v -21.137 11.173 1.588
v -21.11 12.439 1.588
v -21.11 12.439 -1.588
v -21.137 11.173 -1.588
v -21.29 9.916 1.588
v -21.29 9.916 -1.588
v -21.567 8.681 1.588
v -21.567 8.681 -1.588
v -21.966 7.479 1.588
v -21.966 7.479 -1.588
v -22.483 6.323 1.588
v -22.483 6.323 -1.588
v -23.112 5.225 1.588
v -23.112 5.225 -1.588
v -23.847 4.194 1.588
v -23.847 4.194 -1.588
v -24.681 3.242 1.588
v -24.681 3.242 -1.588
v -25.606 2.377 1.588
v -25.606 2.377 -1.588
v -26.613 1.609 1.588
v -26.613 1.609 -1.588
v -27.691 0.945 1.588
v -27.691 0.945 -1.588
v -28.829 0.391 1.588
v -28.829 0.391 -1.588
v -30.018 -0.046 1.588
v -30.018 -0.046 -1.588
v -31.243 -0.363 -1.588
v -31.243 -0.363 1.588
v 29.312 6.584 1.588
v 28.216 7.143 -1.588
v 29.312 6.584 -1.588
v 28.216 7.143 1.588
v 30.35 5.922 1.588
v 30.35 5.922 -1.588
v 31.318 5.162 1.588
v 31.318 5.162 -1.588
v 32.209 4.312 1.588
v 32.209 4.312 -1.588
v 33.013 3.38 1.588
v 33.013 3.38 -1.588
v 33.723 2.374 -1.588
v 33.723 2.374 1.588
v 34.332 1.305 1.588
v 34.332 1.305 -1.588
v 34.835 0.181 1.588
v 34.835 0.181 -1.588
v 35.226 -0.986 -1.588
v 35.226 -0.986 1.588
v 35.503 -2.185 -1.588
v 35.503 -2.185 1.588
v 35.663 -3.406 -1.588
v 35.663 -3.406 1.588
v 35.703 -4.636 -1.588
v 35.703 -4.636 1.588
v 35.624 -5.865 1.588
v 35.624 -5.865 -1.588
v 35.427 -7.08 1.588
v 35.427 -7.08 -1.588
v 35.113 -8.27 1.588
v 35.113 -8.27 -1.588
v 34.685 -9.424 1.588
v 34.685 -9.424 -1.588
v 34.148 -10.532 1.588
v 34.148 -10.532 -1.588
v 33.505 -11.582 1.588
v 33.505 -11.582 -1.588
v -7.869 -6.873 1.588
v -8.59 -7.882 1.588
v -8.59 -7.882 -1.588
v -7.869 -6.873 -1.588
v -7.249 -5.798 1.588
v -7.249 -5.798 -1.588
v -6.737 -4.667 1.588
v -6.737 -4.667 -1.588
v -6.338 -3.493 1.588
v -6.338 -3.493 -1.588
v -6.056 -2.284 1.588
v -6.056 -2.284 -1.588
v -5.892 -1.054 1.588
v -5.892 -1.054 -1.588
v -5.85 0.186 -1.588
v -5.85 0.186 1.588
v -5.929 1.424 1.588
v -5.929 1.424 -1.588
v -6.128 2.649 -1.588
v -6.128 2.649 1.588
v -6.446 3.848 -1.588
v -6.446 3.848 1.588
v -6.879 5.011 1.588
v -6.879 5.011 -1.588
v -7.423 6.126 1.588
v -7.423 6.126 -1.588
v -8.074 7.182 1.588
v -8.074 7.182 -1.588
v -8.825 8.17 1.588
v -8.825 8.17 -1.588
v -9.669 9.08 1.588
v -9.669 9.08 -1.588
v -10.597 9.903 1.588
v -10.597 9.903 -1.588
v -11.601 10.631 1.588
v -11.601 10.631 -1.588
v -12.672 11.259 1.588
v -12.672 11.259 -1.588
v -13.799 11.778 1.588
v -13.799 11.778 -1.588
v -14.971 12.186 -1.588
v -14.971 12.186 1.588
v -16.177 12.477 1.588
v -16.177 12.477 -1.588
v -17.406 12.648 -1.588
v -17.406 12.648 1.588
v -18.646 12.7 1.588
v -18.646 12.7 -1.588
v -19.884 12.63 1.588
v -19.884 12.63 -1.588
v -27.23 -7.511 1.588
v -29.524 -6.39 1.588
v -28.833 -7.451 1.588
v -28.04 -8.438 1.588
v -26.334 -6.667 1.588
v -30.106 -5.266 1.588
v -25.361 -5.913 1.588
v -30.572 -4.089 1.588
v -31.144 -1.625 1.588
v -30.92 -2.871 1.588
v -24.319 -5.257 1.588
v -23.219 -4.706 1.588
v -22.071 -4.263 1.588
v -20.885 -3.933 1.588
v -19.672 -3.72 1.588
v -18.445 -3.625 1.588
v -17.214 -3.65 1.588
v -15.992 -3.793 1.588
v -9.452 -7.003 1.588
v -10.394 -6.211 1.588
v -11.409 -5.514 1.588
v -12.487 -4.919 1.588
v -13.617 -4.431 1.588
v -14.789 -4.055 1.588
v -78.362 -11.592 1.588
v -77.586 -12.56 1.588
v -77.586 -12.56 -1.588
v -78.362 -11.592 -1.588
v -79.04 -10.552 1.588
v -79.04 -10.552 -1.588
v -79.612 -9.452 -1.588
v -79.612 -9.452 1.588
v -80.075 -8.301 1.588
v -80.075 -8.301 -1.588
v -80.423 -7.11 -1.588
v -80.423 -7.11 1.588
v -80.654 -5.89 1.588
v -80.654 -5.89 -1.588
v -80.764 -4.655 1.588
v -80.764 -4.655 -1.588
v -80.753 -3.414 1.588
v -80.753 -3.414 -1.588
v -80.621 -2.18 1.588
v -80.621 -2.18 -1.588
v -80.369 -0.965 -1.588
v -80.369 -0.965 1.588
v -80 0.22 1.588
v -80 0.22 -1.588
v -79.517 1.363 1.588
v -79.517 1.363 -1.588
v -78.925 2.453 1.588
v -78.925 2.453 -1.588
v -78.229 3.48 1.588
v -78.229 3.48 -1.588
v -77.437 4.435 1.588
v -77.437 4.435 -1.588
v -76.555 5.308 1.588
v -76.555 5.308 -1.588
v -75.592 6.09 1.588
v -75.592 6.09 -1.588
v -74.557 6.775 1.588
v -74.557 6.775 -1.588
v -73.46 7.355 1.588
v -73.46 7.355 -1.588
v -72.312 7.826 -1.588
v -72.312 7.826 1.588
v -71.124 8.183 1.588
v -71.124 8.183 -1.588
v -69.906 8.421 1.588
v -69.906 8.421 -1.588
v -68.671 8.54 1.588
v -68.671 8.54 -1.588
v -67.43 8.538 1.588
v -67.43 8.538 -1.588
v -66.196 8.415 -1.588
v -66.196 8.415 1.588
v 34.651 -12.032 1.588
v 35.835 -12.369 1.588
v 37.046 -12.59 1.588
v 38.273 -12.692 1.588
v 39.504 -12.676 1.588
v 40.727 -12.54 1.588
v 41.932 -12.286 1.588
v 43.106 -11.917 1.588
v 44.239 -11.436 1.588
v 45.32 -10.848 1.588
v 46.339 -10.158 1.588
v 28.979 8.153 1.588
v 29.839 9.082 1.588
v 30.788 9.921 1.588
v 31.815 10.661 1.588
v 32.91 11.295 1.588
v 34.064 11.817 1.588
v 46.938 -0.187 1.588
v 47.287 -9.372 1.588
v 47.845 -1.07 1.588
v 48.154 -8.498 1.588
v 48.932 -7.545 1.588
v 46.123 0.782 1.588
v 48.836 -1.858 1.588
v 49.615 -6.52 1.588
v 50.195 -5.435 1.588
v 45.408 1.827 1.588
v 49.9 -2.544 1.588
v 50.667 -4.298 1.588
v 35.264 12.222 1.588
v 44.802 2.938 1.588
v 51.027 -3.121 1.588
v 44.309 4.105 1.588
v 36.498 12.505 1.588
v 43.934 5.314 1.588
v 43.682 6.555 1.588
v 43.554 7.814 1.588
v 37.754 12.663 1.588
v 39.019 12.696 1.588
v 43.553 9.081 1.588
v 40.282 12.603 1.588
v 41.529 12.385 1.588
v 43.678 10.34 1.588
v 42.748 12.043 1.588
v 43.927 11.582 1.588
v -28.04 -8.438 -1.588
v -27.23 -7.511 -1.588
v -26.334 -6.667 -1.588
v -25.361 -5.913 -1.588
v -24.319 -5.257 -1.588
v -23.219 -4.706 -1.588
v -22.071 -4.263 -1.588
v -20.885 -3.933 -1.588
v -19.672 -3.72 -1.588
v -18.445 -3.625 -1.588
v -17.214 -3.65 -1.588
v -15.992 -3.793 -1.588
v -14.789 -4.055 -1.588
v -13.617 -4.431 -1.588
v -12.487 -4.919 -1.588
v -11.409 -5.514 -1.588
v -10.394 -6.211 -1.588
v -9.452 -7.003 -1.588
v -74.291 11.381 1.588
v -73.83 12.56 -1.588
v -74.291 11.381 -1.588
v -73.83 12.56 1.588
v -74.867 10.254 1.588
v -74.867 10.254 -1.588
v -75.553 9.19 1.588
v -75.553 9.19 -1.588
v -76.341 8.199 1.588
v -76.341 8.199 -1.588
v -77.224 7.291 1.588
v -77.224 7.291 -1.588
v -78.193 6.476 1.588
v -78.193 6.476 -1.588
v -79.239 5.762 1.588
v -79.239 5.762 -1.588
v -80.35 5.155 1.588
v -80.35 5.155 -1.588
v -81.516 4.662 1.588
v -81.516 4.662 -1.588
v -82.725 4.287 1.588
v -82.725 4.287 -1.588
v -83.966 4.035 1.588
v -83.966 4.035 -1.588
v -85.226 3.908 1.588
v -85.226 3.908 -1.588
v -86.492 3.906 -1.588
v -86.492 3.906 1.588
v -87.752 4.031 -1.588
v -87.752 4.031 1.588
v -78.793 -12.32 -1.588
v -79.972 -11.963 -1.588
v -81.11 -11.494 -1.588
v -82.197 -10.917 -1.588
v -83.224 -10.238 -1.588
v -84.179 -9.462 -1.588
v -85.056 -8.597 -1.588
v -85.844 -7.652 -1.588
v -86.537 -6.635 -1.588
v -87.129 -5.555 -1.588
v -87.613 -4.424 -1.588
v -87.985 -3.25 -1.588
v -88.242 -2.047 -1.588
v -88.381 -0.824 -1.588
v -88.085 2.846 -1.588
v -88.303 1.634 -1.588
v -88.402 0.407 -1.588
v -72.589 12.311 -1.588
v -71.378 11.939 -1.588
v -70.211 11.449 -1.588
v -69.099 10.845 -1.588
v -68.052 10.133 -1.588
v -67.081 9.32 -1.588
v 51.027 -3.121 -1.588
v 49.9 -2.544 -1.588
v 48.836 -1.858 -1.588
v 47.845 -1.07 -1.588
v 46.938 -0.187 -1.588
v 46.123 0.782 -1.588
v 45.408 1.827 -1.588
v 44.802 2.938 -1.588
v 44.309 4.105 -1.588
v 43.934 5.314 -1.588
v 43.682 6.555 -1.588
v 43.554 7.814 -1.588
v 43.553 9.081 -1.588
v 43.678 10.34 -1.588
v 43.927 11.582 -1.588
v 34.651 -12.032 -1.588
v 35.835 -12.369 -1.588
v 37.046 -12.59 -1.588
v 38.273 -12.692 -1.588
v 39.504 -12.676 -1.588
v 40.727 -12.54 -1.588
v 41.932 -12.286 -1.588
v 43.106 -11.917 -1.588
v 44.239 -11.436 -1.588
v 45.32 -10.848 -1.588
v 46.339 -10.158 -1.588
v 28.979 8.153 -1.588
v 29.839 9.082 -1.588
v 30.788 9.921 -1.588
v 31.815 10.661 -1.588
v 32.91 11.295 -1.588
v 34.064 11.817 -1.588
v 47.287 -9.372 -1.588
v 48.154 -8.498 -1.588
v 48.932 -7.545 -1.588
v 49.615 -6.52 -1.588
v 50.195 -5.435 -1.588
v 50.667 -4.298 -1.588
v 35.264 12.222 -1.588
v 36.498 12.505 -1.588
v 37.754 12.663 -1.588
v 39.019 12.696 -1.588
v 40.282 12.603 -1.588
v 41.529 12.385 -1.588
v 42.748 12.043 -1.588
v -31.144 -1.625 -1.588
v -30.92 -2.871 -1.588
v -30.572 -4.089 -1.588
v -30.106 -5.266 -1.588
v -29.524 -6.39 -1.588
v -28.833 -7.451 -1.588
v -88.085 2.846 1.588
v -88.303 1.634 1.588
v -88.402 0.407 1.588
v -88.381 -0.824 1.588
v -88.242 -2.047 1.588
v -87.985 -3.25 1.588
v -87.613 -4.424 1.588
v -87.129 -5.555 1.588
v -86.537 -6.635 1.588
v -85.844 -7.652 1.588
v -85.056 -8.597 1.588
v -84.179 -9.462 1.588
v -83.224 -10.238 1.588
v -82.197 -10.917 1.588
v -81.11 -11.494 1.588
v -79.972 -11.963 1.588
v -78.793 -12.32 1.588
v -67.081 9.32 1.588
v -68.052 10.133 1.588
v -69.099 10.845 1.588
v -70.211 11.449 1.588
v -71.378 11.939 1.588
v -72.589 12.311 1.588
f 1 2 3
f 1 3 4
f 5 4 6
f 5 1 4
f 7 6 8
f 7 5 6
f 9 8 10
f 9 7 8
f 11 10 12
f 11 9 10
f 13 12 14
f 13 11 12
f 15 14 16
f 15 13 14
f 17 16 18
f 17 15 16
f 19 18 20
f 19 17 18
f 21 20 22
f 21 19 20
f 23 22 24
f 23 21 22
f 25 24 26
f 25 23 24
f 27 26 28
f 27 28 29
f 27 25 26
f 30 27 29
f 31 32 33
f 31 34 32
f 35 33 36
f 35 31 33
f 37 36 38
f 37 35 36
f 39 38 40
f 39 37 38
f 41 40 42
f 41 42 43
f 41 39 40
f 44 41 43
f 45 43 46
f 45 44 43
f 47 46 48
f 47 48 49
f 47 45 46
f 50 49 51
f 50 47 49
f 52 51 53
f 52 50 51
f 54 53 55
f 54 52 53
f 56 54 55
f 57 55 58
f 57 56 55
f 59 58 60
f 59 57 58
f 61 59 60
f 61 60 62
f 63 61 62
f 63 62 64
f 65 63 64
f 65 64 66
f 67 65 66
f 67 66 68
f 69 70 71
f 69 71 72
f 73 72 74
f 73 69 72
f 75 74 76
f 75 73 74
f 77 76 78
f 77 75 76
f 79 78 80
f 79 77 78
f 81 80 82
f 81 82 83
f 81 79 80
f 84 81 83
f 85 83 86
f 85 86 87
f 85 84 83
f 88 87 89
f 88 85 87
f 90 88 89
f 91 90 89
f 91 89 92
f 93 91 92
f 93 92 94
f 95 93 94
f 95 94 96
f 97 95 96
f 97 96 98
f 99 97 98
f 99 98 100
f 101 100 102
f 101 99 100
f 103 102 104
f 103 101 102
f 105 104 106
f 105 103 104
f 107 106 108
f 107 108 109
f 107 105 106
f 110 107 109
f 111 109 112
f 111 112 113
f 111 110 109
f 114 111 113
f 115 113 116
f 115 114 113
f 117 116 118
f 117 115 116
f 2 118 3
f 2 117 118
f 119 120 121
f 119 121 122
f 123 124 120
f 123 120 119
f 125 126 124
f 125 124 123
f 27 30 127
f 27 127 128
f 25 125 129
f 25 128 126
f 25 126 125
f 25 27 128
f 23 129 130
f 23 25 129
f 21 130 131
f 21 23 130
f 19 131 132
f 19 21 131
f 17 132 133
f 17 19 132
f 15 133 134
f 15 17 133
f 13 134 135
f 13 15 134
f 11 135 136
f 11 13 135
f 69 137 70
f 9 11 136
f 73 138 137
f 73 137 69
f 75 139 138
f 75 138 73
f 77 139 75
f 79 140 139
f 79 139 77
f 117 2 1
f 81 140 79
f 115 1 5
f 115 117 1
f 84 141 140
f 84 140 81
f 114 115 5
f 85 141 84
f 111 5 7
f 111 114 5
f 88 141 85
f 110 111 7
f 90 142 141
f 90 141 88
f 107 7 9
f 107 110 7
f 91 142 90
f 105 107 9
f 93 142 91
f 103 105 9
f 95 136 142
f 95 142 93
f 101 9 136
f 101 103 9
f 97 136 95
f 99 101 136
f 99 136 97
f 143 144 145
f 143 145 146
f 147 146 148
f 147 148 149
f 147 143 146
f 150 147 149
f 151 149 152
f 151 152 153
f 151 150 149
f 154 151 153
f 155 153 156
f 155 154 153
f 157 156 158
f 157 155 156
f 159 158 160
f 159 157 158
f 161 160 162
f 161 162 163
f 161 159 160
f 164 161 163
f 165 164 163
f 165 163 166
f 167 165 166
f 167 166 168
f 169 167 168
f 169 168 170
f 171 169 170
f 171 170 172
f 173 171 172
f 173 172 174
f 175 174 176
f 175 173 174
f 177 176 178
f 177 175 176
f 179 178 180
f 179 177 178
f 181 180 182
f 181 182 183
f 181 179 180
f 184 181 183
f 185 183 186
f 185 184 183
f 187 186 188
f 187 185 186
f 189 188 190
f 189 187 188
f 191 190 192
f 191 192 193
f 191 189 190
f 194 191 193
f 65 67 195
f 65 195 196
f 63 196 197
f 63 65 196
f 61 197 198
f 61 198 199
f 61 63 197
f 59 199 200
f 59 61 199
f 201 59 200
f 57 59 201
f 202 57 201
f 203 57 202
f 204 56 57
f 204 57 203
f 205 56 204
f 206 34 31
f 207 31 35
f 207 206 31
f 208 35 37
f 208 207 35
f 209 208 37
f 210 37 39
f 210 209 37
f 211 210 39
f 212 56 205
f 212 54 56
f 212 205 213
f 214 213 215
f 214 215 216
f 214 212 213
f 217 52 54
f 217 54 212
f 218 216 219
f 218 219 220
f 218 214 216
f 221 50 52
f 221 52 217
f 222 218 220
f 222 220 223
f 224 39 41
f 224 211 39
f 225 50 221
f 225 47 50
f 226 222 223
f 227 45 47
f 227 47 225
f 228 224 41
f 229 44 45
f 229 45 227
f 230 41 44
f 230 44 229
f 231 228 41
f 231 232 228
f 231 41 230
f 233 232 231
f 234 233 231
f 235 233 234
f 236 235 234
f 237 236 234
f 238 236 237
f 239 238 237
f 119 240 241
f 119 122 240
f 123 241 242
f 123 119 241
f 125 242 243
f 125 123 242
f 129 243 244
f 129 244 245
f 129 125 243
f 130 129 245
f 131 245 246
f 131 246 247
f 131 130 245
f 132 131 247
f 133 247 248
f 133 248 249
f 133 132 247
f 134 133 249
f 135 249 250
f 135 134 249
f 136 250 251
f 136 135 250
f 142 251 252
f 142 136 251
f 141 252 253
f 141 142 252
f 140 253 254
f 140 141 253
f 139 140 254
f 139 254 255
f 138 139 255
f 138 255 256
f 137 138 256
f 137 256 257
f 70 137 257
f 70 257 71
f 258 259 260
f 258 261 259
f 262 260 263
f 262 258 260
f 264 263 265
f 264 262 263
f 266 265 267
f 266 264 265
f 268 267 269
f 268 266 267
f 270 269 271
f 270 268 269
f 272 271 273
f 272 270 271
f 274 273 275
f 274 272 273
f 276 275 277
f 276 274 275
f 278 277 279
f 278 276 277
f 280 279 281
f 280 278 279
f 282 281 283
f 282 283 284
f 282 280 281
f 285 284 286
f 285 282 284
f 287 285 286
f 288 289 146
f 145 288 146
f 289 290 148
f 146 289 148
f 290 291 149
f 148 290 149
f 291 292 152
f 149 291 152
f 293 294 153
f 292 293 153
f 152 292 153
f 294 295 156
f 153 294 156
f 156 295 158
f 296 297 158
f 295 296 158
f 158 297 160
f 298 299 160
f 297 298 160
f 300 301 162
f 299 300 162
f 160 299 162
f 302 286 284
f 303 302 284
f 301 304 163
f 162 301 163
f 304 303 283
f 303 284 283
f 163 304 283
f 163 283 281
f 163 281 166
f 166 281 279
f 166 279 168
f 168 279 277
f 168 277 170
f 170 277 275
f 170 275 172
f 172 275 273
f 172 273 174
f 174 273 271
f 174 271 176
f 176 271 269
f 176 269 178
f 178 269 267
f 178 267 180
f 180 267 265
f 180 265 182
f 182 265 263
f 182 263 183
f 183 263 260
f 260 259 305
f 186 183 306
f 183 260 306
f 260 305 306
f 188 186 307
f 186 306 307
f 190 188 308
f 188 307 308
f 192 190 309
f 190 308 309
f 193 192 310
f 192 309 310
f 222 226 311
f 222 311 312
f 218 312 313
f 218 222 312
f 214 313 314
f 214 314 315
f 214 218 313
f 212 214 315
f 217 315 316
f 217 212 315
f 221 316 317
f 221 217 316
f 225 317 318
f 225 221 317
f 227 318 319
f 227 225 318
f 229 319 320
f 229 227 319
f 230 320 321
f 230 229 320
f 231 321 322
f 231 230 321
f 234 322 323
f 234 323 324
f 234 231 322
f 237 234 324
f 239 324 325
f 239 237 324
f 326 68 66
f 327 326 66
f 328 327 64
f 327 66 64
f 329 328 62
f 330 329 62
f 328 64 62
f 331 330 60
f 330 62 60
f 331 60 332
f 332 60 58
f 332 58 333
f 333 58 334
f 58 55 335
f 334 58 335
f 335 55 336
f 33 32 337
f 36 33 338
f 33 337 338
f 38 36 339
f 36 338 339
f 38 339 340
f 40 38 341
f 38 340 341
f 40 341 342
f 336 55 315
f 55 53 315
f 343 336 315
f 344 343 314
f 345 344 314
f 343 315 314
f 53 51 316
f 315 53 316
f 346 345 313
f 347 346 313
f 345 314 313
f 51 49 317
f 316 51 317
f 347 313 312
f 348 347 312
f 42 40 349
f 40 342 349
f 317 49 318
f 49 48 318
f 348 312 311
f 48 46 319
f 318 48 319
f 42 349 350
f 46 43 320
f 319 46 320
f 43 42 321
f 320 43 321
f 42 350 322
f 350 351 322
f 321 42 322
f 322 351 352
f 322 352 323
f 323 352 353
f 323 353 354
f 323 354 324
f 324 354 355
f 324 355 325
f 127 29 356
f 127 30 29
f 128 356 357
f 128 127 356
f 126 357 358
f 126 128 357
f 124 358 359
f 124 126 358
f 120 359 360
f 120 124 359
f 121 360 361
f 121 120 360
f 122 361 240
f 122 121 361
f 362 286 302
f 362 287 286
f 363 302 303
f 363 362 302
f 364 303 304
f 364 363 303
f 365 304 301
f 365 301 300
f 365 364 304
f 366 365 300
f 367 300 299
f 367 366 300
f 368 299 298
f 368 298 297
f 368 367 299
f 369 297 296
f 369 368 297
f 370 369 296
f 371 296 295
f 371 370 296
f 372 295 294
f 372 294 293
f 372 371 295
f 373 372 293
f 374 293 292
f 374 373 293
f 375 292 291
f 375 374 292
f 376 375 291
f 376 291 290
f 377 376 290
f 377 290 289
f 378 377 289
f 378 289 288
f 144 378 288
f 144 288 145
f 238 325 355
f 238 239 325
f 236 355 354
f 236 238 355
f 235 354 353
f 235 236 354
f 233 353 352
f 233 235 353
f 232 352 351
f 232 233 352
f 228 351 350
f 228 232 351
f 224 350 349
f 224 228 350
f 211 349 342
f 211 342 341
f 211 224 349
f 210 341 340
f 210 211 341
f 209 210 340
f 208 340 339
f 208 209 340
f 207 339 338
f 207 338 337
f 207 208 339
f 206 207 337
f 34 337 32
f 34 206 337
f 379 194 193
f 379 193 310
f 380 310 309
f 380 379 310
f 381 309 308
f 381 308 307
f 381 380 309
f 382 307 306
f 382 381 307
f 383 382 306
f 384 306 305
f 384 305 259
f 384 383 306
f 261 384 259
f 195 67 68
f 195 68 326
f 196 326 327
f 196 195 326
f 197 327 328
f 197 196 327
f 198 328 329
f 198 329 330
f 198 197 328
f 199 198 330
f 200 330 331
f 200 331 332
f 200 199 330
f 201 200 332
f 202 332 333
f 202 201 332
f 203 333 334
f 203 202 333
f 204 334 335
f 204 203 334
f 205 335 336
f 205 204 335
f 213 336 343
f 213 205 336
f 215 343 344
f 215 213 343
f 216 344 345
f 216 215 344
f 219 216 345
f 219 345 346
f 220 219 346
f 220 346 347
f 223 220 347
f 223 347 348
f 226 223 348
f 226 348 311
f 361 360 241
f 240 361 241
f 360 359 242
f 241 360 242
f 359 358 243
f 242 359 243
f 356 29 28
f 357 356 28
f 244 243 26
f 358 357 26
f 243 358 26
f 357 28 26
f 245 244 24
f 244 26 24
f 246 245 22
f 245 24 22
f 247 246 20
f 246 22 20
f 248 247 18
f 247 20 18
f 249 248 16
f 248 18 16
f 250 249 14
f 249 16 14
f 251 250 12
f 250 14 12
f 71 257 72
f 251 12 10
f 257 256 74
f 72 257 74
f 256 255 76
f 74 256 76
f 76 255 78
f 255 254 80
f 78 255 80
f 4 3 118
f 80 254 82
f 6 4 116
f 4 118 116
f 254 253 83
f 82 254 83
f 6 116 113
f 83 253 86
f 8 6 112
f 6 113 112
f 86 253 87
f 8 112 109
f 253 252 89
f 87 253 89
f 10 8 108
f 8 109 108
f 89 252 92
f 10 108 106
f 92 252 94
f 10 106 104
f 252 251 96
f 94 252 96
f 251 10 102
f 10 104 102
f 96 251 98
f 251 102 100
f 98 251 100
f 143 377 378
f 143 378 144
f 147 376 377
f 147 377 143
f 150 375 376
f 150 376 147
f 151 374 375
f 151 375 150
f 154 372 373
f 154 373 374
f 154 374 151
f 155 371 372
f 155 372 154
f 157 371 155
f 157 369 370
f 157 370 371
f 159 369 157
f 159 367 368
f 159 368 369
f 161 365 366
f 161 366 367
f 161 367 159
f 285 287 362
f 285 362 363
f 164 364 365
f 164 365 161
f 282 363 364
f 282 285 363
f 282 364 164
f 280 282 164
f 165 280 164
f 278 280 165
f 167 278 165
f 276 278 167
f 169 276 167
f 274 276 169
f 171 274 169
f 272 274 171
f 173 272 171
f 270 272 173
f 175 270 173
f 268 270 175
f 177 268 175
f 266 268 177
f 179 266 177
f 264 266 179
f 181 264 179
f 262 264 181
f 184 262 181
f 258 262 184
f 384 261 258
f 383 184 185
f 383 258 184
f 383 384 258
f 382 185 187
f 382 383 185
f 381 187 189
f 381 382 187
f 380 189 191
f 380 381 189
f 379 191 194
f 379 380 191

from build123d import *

# Parameters (mm, degrees)
F1_DEPTH = 1.5875


# Not quite as in the source:
# - a feature of the source that left no trace in its solid (it failed there, or was rolled back) is left out


with BuildPart() as f1:
    # F0 (on Top) → F1 (new body, symmetric)
    with BuildSketch(Plane.XY):
        with BuildLine():
            ThreePointArc((28.2155579418, 7.1429440823), (35.2262329925, -0.9860169952), (33.5054625888, -11.5817011206))
            ThreePointArc((33.5054625888, -11.5817011206), (44.2389831087, -11.4364079158), (51.0270560551, -3.1206614946))
            ThreePointArc((51.0270560551, -3.1206614946), (44.8016172576, 2.9384882245), (43.9274008255, 11.5817011206))
            ThreePointArc((43.9274008255, 11.5817011206), (35.2636916641, 12.2216441691), (28.2155579418, 7.1429440823))
        make_face()
    extrude(amount=F1_DEPTH, both=True)


with BuildPart() as f1b:
    # F0 (on Top) → F1, piece 2 (new body, symmetric)
    with BuildSketch(Plane.XY):
        with BuildLine():
            ThreePointArc((-87.7515485228, 4.0306815011), (-86.5371761619, -6.634911433), (-77.5862744551, -12.5603592221))
            ThreePointArc((-77.5862744551, -12.5603592221), (-79.234417553, 1.9149565428), (-66.1957682837, 8.4145540225))
            ThreePointArc((-66.1957682837, 8.4145540225), (-69.6473816706, 11.1605182273), (-73.830012371, 12.5603592221))
            ThreePointArc((-73.830012371, 12.5603592221), (-79.2385060477, 5.7620079744), (-87.7515485228, 4.0306815011))
        make_face()
    extrude(amount=F1_DEPTH, both=True)


with BuildPart() as f1c:
    # F0 (on Top) → F1, piece 3 (new body, symmetric)
    with BuildSketch(Plane.XY):
        with BuildLine():
            ThreePointArc((-28.0400193697, -8.4381200139), (-18.444887024, -3.6253237231), (-8.5904389845, -7.8820157138))
            ThreePointArc((-8.5904389845, -7.8820157138), (-7.7359985931, 6.661748372), (-21.1104305579, 12.4389199798))
            ThreePointArc((-21.1104305579, 12.4389199798), (-23.8471389134, 4.1939329625), (-31.2433546383, -0.3629713035))
            ThreePointArc((-31.2433546383, -0.3629713035), (-30.3536202994, -4.6829628767), (-28.0400193697, -8.4381200139))
        make_face()
    extrude(amount=F1_DEPTH, both=True)


solid = Compound([f1.part, f1b.part, f1c.part])
